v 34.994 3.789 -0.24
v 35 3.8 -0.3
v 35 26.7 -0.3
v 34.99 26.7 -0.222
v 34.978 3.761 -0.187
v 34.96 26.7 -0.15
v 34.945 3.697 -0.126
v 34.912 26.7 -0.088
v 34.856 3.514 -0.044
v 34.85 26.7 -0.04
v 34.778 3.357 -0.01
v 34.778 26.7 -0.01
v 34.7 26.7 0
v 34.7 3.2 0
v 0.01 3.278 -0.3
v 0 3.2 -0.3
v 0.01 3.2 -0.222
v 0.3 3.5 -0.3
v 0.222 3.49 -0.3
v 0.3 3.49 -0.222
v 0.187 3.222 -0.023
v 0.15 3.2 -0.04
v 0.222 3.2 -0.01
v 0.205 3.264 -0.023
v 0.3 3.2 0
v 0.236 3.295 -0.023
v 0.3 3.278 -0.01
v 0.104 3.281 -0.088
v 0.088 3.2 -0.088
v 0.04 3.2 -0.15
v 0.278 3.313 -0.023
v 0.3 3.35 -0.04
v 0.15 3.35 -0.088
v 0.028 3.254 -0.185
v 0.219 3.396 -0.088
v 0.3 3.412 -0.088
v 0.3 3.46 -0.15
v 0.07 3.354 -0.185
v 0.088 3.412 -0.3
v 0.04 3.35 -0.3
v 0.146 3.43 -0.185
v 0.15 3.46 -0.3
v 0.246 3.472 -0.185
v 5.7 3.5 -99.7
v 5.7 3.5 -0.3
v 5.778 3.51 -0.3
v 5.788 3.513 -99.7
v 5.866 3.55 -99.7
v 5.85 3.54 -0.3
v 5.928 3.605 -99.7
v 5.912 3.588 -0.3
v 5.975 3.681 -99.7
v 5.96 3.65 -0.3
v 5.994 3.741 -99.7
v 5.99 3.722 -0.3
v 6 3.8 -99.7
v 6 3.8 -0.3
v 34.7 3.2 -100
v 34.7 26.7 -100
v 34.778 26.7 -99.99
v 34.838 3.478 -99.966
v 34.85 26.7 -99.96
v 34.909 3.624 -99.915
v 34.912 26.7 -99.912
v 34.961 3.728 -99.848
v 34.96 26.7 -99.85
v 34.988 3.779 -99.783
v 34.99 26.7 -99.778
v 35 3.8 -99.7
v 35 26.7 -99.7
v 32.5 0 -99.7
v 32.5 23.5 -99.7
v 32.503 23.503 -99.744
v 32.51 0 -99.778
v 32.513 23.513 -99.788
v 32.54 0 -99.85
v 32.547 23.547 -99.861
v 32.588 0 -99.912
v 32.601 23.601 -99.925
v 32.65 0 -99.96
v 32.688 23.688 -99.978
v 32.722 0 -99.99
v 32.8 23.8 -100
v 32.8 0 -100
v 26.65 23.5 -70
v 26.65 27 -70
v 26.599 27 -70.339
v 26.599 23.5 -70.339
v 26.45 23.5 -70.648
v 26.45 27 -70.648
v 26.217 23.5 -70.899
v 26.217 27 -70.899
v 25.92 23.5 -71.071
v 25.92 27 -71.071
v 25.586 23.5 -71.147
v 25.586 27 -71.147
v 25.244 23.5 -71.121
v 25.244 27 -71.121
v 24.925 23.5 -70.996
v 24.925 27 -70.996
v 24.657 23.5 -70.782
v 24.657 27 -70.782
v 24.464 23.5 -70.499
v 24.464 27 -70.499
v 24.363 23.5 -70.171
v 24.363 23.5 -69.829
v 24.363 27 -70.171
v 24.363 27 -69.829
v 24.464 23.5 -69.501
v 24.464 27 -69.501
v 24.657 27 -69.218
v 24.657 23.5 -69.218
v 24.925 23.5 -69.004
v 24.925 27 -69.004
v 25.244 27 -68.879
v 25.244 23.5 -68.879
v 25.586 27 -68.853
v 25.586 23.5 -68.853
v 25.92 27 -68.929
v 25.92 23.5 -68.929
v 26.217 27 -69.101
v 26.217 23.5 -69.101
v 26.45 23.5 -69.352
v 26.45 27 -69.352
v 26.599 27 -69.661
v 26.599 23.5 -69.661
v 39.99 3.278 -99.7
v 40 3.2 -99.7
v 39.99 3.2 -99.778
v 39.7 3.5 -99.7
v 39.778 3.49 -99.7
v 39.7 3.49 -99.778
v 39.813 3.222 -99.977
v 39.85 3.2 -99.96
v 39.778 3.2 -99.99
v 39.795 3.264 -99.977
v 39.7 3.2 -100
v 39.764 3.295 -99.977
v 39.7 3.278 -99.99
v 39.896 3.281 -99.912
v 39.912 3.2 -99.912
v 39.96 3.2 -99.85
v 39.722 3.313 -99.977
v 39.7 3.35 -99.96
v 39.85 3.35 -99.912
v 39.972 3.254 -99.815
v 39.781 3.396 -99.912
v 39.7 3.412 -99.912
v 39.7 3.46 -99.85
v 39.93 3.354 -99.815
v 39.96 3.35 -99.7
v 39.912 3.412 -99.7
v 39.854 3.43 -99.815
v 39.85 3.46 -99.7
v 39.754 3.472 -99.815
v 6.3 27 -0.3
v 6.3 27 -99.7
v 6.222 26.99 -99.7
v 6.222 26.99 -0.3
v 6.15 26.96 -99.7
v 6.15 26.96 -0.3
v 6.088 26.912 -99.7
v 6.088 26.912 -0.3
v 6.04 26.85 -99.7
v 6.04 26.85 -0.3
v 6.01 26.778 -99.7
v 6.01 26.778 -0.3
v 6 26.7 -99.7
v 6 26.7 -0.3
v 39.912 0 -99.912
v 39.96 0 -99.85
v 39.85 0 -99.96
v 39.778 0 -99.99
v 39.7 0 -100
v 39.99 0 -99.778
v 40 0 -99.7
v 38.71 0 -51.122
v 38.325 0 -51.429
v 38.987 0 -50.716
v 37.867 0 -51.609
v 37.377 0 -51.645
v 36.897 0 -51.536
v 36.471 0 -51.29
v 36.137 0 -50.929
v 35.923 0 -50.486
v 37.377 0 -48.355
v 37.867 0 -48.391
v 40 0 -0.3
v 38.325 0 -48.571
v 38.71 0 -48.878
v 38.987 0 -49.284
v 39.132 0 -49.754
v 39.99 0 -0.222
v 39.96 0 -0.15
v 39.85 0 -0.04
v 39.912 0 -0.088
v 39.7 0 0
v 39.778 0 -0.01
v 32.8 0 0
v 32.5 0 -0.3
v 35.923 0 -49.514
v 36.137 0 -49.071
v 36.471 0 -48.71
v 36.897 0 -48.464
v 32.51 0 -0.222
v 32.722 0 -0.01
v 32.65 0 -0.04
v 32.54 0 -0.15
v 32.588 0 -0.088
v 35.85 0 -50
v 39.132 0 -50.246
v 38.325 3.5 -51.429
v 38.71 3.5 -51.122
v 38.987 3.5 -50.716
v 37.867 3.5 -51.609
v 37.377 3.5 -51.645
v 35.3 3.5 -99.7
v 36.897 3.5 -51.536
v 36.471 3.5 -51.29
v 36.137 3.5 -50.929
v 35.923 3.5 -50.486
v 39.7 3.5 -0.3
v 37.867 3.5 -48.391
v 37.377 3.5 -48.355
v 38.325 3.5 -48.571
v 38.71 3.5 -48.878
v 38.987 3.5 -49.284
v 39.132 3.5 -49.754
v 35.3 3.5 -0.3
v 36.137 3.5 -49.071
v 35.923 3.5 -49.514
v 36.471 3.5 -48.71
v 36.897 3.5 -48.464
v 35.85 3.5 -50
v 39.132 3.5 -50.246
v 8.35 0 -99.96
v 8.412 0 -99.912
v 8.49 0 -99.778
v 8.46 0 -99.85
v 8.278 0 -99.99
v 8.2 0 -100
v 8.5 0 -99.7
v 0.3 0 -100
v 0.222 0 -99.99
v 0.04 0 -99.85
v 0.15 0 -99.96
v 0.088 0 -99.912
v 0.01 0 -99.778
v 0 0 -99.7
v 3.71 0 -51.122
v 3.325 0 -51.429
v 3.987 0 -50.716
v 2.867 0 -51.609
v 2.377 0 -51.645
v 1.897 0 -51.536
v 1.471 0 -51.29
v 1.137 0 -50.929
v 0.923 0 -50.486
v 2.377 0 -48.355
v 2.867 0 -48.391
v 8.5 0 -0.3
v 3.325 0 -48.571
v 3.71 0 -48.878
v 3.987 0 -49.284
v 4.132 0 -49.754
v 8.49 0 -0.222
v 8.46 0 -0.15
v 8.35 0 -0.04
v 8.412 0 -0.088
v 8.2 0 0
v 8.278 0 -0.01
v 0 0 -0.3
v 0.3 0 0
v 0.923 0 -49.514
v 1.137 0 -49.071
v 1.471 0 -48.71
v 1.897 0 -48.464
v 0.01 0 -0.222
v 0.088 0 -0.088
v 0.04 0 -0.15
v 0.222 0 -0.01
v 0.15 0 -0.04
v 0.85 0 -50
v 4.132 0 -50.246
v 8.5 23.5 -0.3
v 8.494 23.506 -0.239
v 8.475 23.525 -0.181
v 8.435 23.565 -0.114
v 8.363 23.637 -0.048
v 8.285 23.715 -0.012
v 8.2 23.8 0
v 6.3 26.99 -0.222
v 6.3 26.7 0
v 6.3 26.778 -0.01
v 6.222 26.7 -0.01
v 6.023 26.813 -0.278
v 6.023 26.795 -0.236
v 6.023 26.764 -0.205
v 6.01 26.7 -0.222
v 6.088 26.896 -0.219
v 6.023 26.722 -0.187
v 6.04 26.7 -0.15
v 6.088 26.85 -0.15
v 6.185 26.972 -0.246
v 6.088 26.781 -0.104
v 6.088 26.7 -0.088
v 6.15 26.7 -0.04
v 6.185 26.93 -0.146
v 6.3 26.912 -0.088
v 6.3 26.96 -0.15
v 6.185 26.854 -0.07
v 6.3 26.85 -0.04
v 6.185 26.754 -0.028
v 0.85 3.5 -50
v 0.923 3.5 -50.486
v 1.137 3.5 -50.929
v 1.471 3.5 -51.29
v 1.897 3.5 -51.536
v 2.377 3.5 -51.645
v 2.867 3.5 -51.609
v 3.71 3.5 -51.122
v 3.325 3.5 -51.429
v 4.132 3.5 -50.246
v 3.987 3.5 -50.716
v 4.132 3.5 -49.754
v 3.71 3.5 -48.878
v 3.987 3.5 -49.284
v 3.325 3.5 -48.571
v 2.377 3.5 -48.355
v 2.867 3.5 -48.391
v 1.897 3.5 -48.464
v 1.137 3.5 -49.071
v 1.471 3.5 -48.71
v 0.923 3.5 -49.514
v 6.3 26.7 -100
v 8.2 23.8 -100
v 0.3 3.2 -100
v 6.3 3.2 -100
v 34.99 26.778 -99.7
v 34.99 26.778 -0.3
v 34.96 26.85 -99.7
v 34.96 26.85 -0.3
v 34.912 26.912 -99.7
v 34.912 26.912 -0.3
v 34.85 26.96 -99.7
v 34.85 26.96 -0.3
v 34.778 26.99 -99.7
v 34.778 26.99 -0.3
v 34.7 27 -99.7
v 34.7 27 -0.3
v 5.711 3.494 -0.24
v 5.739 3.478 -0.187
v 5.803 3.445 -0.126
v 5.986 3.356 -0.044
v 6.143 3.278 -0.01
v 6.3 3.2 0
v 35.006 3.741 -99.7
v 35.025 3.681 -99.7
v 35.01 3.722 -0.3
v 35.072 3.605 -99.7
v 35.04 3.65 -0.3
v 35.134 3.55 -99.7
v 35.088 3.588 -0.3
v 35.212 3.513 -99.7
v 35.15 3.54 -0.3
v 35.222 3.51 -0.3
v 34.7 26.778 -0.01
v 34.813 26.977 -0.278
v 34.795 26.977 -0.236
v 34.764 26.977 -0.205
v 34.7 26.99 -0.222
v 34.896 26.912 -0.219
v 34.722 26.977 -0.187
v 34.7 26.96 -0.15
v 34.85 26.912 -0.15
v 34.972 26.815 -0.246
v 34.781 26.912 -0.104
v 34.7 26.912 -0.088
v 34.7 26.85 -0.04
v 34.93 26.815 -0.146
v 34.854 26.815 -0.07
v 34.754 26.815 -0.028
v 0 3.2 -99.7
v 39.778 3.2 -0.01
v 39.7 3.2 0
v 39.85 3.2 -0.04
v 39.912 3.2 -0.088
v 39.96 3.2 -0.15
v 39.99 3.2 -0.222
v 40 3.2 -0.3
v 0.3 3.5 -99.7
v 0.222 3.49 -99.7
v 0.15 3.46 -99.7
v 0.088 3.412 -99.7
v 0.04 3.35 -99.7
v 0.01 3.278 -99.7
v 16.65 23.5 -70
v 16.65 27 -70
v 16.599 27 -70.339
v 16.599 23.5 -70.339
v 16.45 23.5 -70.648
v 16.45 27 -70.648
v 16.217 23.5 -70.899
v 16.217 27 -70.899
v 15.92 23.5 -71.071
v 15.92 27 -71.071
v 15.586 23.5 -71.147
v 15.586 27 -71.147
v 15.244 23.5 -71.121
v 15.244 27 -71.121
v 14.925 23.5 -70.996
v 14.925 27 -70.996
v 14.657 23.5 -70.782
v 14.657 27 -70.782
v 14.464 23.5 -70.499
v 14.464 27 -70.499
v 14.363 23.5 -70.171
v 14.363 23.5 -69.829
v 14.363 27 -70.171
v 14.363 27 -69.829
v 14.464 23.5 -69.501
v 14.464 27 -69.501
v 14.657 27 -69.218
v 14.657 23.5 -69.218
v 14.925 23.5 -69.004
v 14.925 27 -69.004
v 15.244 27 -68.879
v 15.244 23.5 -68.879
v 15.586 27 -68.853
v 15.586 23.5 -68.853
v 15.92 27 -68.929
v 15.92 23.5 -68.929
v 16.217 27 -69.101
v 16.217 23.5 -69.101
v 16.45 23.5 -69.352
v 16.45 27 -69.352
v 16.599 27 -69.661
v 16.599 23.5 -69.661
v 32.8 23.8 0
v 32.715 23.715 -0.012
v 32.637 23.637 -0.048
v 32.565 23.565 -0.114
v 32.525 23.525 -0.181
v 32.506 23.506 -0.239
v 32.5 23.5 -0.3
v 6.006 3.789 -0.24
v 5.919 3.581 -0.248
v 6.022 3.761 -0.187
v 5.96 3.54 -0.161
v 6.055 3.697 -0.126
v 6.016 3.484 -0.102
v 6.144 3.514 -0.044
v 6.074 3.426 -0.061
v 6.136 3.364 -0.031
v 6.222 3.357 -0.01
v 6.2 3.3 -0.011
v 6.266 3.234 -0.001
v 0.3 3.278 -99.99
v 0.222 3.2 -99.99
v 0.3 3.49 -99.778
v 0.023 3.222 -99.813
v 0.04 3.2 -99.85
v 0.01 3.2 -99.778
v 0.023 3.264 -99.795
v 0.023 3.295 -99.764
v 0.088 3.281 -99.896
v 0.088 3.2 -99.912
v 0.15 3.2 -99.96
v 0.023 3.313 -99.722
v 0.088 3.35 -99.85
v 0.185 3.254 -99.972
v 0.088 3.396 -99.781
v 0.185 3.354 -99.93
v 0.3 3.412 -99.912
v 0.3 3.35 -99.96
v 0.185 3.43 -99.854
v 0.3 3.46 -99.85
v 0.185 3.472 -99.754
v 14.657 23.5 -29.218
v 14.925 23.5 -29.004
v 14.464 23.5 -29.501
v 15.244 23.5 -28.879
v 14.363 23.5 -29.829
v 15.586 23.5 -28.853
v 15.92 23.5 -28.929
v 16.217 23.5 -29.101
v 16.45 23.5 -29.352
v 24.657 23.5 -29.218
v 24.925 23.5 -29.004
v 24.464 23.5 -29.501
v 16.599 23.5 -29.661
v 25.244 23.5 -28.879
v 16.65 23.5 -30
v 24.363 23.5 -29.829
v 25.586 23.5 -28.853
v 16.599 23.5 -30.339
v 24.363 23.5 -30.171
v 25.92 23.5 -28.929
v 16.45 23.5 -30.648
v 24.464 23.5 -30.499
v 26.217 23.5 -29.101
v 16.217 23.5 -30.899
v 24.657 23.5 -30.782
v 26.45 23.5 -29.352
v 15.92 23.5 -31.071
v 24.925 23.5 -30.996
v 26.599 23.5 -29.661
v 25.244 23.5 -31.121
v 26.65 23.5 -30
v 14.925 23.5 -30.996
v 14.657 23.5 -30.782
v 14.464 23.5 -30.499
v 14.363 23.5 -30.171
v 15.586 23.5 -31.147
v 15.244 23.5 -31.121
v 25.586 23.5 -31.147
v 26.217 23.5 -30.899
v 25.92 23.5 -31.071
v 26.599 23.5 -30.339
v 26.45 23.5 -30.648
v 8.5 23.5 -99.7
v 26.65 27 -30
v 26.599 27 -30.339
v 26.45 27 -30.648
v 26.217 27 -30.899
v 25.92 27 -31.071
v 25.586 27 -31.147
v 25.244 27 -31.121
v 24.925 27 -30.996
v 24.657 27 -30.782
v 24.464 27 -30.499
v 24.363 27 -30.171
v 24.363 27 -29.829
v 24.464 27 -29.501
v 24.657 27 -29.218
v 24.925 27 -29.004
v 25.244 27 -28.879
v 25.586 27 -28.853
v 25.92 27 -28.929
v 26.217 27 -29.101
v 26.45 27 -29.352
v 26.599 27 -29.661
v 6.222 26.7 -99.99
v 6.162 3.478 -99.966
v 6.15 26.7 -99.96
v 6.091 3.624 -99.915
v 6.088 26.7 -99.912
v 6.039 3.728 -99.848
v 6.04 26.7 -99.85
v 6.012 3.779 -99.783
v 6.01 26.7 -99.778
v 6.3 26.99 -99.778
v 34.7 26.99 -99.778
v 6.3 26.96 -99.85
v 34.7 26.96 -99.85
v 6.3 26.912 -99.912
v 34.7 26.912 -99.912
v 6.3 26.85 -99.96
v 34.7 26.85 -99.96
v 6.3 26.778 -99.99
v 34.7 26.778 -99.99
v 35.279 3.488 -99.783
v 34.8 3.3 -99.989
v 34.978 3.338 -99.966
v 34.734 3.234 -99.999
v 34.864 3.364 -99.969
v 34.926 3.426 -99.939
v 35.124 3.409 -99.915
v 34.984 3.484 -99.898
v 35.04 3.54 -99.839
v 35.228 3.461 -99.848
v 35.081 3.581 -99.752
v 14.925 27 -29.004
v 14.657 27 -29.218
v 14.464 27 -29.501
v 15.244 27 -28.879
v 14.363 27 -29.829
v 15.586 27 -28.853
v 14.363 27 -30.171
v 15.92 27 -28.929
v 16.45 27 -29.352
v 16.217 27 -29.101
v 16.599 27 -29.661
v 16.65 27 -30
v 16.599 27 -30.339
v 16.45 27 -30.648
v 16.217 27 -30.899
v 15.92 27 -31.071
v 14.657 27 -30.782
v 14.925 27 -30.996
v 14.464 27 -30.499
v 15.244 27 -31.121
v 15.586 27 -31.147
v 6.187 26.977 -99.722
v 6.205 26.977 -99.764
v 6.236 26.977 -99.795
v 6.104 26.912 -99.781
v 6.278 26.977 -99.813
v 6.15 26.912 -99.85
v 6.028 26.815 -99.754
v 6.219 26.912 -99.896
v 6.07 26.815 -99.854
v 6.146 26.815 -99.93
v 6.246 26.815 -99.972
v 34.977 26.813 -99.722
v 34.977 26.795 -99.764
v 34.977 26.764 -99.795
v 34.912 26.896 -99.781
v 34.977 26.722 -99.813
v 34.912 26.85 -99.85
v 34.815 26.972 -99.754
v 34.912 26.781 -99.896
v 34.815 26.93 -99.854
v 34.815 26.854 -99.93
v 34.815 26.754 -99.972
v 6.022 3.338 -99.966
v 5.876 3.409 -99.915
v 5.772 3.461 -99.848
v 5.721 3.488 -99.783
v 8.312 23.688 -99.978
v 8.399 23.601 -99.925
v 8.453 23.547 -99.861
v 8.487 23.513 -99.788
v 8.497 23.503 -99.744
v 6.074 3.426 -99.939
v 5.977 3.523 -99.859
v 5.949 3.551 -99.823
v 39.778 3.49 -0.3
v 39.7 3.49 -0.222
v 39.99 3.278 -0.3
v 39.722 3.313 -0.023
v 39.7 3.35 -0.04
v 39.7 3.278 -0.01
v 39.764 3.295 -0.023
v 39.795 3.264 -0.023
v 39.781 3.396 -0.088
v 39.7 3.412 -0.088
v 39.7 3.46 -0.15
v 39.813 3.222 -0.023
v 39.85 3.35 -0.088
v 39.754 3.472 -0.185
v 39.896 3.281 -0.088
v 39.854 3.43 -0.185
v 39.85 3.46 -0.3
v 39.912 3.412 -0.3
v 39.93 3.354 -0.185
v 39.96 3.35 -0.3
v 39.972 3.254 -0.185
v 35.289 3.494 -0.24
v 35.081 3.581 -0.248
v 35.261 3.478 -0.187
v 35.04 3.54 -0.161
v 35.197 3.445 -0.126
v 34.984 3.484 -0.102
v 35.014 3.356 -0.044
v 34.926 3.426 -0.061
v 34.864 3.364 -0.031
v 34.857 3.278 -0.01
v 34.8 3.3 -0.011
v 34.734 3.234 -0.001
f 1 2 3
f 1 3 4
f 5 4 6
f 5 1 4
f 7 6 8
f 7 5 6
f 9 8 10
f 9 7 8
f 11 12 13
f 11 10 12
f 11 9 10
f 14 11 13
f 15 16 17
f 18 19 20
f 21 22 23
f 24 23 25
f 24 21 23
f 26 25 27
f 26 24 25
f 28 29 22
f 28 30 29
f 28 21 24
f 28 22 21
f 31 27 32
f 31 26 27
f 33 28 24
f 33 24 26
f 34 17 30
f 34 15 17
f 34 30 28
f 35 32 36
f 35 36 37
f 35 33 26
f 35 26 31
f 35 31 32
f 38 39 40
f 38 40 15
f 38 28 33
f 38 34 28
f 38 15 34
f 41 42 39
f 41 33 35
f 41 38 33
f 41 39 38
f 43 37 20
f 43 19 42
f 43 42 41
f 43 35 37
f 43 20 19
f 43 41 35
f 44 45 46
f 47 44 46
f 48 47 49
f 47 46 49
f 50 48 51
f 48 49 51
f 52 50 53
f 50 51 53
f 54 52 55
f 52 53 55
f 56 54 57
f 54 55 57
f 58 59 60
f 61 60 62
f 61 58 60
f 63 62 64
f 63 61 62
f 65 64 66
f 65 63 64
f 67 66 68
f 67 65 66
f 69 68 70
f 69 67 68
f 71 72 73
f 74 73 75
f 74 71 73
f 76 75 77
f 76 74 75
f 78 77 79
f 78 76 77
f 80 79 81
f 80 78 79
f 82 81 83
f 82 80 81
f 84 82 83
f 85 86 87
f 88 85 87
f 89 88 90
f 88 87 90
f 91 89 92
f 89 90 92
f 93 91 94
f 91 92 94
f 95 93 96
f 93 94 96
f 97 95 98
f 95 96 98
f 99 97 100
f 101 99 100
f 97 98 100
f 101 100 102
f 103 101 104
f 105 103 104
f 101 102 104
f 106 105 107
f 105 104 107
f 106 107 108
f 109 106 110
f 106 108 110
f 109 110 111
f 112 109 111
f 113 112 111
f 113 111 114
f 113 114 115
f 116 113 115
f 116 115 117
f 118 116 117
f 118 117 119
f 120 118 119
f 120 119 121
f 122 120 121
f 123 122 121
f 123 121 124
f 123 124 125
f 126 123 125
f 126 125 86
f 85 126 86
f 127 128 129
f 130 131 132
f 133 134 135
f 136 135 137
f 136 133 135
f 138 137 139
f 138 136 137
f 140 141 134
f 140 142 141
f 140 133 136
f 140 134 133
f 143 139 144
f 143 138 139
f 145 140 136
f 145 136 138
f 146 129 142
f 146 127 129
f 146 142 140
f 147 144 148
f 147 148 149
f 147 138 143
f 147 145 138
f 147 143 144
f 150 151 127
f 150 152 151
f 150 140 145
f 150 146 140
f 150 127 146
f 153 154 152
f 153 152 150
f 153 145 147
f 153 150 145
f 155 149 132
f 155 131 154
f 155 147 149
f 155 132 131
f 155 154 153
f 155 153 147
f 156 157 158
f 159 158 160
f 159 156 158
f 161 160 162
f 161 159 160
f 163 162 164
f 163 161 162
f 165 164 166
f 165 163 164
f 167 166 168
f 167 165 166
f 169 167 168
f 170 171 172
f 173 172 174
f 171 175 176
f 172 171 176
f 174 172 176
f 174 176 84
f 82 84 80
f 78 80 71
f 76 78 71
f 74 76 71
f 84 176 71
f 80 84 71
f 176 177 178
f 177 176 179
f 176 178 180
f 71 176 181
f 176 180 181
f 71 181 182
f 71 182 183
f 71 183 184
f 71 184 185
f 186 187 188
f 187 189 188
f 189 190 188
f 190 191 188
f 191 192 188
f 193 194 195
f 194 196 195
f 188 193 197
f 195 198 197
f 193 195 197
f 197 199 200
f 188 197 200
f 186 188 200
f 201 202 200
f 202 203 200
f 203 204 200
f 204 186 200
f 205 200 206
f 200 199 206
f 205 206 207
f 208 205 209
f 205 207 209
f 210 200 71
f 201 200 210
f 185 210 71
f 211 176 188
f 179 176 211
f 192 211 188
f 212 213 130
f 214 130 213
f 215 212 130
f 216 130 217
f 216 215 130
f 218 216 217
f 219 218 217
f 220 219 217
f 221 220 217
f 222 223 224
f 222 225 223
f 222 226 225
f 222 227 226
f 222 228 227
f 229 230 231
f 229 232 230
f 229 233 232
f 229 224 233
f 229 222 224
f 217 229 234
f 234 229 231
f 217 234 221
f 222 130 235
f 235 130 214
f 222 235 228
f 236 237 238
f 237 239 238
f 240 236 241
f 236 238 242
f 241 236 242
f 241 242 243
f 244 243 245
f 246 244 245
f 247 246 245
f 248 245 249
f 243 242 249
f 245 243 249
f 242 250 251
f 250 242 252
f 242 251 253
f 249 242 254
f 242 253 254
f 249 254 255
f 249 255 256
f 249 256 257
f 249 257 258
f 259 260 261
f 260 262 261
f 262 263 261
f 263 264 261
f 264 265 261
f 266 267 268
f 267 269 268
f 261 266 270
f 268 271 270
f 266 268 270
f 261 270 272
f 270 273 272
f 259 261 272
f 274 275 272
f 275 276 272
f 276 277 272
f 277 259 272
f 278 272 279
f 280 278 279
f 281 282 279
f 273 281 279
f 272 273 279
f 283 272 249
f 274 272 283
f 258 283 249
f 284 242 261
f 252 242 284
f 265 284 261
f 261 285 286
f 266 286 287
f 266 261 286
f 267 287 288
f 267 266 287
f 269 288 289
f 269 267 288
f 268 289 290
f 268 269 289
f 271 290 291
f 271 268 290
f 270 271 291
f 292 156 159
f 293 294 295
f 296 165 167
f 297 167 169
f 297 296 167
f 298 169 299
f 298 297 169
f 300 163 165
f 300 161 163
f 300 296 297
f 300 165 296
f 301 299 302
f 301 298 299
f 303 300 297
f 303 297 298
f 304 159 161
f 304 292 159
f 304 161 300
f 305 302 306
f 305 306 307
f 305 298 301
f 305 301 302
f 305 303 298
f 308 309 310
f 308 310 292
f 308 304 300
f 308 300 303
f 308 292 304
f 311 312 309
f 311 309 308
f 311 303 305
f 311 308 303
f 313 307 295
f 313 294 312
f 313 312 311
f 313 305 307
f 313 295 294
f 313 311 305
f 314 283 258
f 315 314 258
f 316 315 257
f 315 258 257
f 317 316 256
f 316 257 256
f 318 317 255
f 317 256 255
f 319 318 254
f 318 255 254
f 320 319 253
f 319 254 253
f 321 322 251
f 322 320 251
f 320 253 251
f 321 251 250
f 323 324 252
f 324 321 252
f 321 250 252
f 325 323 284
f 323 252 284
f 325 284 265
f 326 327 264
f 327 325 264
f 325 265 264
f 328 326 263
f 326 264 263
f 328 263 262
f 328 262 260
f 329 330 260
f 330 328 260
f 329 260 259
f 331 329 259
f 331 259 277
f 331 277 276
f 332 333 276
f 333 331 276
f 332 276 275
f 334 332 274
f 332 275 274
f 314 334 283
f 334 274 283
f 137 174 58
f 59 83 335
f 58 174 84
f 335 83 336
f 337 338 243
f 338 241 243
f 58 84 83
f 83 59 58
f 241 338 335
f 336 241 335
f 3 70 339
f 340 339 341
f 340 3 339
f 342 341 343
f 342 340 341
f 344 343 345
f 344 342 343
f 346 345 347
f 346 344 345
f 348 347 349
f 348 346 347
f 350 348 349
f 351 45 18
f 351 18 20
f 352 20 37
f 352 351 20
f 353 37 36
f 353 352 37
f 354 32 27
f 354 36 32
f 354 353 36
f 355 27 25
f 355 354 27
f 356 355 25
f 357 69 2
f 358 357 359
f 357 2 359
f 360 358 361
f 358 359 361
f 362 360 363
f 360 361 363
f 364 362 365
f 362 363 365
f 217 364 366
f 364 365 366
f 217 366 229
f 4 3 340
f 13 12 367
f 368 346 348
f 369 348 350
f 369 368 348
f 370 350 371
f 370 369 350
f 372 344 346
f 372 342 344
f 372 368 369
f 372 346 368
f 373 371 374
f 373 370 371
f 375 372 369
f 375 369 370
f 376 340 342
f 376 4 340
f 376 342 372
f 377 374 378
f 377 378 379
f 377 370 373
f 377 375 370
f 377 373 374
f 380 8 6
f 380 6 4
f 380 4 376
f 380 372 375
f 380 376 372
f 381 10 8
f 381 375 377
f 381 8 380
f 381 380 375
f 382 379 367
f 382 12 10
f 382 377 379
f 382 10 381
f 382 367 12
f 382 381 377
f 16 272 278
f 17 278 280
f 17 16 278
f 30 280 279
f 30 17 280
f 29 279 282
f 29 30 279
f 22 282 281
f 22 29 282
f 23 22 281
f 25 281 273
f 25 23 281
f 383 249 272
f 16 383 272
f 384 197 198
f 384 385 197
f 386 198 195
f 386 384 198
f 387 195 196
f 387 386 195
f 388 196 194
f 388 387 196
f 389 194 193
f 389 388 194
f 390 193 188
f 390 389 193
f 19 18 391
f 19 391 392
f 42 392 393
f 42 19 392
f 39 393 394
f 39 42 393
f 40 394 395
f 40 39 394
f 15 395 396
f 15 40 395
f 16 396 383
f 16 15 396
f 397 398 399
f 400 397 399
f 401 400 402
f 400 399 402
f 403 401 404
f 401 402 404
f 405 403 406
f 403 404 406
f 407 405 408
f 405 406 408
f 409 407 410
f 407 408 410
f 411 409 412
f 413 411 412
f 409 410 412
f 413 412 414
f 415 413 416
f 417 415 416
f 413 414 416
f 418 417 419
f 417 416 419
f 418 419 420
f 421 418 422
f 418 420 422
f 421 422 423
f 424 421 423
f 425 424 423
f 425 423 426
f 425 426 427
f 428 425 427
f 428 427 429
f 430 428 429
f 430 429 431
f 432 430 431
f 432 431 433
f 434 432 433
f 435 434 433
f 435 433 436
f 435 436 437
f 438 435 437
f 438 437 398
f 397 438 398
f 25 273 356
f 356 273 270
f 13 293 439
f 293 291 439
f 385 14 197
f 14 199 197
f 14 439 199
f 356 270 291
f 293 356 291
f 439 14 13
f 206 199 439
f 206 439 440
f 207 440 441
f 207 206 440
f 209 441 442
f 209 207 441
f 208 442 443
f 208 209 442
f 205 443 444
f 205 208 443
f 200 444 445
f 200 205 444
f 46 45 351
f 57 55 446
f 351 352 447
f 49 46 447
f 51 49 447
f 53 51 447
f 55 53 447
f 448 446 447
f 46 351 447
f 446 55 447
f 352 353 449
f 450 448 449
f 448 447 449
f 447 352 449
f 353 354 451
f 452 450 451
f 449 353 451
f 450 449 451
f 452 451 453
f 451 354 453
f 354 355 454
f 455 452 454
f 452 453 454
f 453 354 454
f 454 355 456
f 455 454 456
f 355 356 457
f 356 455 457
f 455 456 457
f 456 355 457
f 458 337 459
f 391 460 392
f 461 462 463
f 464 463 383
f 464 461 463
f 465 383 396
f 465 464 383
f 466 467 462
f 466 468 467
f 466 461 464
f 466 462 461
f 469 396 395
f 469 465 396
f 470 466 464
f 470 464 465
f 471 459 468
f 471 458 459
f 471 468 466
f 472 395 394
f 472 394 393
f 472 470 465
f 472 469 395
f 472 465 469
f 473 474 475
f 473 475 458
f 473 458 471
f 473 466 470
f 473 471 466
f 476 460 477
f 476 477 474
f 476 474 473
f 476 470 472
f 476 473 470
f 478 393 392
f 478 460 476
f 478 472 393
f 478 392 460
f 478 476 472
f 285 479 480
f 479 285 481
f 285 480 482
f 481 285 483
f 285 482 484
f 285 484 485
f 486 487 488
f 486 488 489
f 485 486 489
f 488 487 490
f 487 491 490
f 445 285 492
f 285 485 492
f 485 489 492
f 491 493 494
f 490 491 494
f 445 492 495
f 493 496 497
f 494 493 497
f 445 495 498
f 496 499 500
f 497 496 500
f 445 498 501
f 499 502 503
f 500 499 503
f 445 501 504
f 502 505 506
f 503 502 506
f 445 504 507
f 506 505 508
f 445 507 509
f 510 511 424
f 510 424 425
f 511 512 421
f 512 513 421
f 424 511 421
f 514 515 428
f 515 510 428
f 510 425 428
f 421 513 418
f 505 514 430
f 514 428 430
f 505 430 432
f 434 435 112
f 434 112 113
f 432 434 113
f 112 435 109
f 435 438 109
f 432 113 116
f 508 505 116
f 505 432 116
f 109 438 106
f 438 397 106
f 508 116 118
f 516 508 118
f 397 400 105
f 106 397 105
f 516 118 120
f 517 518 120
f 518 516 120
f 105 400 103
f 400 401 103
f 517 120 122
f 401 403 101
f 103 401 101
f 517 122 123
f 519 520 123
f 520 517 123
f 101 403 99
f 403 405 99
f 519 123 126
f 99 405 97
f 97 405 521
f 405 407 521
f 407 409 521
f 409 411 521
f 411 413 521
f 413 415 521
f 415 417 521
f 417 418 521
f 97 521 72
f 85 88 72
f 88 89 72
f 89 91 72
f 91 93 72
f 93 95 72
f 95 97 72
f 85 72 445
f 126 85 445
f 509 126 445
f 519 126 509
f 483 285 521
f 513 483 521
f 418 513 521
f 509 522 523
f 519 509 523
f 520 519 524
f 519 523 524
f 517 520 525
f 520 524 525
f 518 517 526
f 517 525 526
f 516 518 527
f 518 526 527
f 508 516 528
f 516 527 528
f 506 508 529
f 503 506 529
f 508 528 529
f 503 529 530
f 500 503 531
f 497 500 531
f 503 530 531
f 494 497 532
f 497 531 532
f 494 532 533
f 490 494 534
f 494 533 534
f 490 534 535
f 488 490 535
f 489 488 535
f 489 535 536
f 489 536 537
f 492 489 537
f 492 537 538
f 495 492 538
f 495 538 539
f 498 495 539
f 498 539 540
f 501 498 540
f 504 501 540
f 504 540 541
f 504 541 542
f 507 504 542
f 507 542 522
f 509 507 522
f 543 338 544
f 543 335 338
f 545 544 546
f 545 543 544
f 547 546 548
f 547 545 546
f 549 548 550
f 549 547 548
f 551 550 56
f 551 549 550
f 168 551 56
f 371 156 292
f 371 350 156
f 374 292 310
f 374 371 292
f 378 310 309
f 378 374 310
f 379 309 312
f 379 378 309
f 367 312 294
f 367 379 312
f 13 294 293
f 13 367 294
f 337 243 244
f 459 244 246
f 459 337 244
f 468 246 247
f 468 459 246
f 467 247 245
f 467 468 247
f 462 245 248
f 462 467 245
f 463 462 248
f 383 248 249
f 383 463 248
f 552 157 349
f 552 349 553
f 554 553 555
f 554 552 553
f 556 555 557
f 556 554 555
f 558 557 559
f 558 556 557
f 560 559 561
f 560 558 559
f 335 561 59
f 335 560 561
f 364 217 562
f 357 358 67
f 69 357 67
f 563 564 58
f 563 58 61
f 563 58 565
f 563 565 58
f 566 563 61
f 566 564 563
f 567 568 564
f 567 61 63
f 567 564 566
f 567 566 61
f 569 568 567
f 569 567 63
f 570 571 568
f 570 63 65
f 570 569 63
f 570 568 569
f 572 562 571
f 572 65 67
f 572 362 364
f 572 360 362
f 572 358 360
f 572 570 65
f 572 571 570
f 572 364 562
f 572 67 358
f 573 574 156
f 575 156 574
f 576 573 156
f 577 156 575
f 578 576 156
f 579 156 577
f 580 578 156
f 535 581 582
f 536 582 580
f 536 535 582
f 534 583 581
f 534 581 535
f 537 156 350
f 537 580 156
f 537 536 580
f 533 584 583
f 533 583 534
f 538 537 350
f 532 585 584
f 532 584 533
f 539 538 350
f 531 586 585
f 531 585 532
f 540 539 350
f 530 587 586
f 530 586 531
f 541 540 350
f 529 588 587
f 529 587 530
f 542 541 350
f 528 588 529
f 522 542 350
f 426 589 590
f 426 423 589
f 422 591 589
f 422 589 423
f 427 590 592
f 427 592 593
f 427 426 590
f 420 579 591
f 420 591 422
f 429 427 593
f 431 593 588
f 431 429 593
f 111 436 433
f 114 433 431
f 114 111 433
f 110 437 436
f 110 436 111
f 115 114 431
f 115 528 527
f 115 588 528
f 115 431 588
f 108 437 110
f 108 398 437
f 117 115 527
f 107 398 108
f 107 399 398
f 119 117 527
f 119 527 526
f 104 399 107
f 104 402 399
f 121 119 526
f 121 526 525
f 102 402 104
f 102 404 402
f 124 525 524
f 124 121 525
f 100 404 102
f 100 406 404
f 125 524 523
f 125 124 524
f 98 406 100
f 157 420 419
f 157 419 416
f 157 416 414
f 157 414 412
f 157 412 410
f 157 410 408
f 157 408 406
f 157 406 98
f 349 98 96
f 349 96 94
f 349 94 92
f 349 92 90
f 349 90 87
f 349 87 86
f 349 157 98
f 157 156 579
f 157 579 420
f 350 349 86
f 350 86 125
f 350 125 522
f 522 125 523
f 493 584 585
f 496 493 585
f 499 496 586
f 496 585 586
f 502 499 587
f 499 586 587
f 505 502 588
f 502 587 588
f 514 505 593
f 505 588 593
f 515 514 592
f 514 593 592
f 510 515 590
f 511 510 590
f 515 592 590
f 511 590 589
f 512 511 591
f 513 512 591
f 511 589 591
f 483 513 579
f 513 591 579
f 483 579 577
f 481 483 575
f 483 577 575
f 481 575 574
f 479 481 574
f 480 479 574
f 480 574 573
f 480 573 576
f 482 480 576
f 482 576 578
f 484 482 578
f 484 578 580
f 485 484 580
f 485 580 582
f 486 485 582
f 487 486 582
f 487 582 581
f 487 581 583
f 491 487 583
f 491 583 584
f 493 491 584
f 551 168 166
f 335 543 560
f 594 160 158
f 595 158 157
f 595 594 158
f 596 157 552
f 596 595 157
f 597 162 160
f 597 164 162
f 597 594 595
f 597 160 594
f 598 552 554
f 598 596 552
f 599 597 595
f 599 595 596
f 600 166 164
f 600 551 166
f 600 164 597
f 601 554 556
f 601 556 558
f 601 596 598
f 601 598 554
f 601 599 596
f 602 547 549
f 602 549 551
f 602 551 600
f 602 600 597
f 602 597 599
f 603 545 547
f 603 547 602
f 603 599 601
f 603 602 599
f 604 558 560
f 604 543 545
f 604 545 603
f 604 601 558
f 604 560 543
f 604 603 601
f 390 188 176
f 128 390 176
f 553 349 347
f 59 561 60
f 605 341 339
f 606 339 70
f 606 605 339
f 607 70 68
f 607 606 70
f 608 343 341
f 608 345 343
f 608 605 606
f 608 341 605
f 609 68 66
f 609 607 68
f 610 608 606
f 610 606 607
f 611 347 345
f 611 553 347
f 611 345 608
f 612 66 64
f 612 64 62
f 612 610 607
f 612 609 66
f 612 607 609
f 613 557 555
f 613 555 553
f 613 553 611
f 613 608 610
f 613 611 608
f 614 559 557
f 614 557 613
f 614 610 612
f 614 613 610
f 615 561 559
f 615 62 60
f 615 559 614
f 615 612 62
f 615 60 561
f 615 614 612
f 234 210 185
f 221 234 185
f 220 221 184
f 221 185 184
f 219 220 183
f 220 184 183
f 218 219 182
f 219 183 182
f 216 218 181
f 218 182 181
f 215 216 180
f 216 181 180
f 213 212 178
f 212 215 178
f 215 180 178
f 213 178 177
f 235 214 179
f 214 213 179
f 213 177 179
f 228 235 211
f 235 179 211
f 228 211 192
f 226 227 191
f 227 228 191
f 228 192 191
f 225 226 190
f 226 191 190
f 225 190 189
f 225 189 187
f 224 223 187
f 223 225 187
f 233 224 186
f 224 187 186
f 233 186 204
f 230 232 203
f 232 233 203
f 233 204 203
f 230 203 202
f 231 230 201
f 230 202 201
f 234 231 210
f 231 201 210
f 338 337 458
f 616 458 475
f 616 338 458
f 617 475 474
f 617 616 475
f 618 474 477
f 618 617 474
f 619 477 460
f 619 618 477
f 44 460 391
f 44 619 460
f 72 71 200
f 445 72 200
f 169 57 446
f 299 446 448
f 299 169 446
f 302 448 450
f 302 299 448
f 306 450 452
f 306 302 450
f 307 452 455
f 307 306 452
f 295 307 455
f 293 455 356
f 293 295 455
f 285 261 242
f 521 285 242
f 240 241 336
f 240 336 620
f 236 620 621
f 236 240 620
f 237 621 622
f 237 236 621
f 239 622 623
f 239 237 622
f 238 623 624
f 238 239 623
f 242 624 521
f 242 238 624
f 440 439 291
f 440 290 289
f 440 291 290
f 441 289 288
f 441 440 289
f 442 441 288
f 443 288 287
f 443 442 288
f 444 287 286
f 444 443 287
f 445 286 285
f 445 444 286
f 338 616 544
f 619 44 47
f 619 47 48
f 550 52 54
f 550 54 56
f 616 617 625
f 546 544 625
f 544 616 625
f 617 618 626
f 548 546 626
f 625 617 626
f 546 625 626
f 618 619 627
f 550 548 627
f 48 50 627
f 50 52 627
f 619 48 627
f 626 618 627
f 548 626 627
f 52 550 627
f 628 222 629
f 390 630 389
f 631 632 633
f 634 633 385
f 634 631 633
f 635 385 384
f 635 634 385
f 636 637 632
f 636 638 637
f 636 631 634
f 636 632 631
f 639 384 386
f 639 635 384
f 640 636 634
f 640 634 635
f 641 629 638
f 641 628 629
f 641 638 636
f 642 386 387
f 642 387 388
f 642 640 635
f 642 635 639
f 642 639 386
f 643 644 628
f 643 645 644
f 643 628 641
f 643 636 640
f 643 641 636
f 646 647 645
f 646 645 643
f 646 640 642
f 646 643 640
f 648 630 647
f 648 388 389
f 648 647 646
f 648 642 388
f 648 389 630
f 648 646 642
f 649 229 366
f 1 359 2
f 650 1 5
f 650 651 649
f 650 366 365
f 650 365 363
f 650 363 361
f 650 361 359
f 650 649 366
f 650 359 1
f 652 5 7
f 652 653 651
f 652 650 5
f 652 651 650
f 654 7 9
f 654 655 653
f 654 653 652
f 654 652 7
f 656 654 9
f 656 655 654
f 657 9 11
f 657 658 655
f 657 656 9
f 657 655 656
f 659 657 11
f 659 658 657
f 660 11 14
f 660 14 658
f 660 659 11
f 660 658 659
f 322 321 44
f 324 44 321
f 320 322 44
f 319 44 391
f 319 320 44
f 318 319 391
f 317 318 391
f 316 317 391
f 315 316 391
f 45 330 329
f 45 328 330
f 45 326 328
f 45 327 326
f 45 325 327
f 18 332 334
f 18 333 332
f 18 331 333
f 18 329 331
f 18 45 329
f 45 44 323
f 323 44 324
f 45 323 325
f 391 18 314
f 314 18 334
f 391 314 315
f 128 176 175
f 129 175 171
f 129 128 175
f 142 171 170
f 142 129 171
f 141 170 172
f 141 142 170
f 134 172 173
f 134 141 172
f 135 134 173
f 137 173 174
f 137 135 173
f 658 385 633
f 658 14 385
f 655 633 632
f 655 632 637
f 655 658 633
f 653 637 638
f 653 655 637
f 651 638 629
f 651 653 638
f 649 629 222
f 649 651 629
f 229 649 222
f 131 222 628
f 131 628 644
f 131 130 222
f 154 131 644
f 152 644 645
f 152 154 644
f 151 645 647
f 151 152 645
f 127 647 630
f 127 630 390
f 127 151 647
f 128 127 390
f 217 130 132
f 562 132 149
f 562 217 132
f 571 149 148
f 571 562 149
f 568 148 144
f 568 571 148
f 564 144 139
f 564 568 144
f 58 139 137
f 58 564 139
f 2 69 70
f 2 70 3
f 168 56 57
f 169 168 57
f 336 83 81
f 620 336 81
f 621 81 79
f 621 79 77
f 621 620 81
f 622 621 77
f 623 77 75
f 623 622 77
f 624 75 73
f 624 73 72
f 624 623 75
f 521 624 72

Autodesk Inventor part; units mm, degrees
ref_plane "YZ Plane" through (0, 0, 0) normal (1, 0, 0) x (0, 1, 0)
ref_plane "XZ Plane" through (0, 0, 0) normal (0, 1, 0) x (-1, 0, 0)
ref_plane "XY Plane" through (0, 0, 0) normal (0, 0, 1) x (1, 0, 0)
sketch "Sketch1" plane through (0, 0, 0) normal (0, 1, 0) x (-1, 0, 0)
  line L0 (-40, 0) -> (-40, -100)
  line L1 (0, -100) -> (0, 0)
  line L2 (-35, 0) -> (-35, -100)
  line L3 (-6, -100) -> (-6, 0)
  circle A0 centre (-2.5, -50) radius 1.65
  circle A1 centre (-37.5, -50) radius 1.65
  line L4 (0, 0) -> (-8.5, 0)
  line L5 (-32.5, 0) -> (-40, 0)
  line L6 (-40, -100) -> (-32.5, -100)
  line L7 (-8.5, -100) -> (0, -100)
  line L8 (-8.5, 0) -> (-8.5, -100)
  line L9 (-32.5, -100) -> (-32.5, 0)
  dimension "d4" = 3.3
  dimension "d5" = 3.3
  dimension "d8" = 2.5
  dimension "d9" = 2.5
extrude "Extrusion1" add sketch "Sketch1" along normal blind 3.5
sketch "Sketch2" plane through (0, 3.5, 0) normal (0, 1, 0) x (1, 0, 0)
  line L0 (8.5, 100) -> (0, 100) projected
  line L1 (8.5, 100) -> (6, 100)
  line L2 (6, 100) -> (6, 0)
  line L3 (6, 0) -> (8.5, 0)
  line L4 (8.5, 0) -> (8.5, 100)
  line L5 (32.5, 100) -> (32.5, 0) projected
  line L6 (32.5, 100) -> (35, 100)
  line L7 (35, 100) -> (35, 0)
  line L8 (35, 0) -> (32.5, 0)
  line L9 (32.5, 0) -> (32.5, 100)
  point P0 (0, 0)
  point P1 (32.5, 0)
  point P2 (6, 100)
  dimension "d10" = 2.5
  dimension "d11" = 100
  dimension "d12" = 2.5
  dimension "d13" = 100
extrude "Extrusion2" add sketch "Sketch2" along normal blind 20
sketch "Sketch3" plane through (0, 23.5, 0) normal (0, 1, 0) x (1, 0, 0)
  line L0 (6, 100) -> (6, 0) projected
  line L1 (35, 100) -> (35, 0) projected
  line L2 (6, 0) -> (35, 0)
  line L3 (35, 0) -> (35, 100)
  line L4 (35, 100) -> (6, 100)
  line L5 (6, 100) -> (6, 0)
  point P0 (0, 0)
  point P1 (35, 0)
  point P2 (6, 100)
extrude "Extrusion3" add sketch "Sketch3" along normal blind 3.5
sketch "Sketch4" plane through (0, 27, 0) normal (0, 1, 0) x (1, 0, 0)
  circle A0 centre (9.75, 80.75) radius 1.15
  circle A1 centre (30.25, 80.75) radius 1.15
  circle A2 centre (9.75, 19.25) radius 1.15
  circle A3 centre (30.25, 19.25) radius 1.15
  line L0 (15.5, 70) -> (25.5, 70)
  line L1 (25.5, 70) -> (25.5, 30)
  line L2 (25.5, 30) -> (15.5, 30)
  line L3 (15.5, 30) -> (15.5, 70)
  circle A4 centre (15.5, 70) radius 1.15
  circle A5 centre (25.5, 70) radius 1.15
  circle A6 centre (15.5, 30) radius 1.15
  circle A7 centre (25.5, 30) radius 1.15
  dimension "d29" = 10
  dimension "d30" = 40
extrude "Extrusion4" cut sketch "Sketch4" against normal blind 3.5 contours L3 A4 L0 | L0 A4 L3 | A5 L1 L0 | L0 L1 A5 | A6 L2 L3 | L3 L2 A6 | A7 L2 L1 | L1 L2 A7
fillet "Fillet1" radius 0.3 24 edges at (6, 15.25, -100) (3, 3.5, -100) (20.5, 27, -100) (8.5, 11.75, -100) (20.5, 23.5, -100) (35, 15.25, -100) (32.5, 11.75, -100) (32.5, 11.75, 0) (35, 15.25, 0) (20.5, 27, 0) (20.5, 23.5, 0) (8.5, 11.75, 0) (6, 15.25, 0) (6, 27, -50) (35, 27, -50) (0, 3.5, -50) (40, 3.5, -50) (37.5, 3.5, 0) (3, 3.5, 0) (0, 1.75, 0) (40, 1.75, 0) (40, 1.75, -100) (37.5, 3.5, -100) (0, 1.75, -100)
fillet "Fillet2" radius 0.3 6 edges at (6.0879, 3.4121, -99.9121) (6.0879, 3.4121, -0.0879) (6, 3.5, -50) (34.9121, 3.4121, -0.0879) (34.9121, 3.4121, -99.9121) (35, 3.5, -50)
properties part number "controllerHousing"
